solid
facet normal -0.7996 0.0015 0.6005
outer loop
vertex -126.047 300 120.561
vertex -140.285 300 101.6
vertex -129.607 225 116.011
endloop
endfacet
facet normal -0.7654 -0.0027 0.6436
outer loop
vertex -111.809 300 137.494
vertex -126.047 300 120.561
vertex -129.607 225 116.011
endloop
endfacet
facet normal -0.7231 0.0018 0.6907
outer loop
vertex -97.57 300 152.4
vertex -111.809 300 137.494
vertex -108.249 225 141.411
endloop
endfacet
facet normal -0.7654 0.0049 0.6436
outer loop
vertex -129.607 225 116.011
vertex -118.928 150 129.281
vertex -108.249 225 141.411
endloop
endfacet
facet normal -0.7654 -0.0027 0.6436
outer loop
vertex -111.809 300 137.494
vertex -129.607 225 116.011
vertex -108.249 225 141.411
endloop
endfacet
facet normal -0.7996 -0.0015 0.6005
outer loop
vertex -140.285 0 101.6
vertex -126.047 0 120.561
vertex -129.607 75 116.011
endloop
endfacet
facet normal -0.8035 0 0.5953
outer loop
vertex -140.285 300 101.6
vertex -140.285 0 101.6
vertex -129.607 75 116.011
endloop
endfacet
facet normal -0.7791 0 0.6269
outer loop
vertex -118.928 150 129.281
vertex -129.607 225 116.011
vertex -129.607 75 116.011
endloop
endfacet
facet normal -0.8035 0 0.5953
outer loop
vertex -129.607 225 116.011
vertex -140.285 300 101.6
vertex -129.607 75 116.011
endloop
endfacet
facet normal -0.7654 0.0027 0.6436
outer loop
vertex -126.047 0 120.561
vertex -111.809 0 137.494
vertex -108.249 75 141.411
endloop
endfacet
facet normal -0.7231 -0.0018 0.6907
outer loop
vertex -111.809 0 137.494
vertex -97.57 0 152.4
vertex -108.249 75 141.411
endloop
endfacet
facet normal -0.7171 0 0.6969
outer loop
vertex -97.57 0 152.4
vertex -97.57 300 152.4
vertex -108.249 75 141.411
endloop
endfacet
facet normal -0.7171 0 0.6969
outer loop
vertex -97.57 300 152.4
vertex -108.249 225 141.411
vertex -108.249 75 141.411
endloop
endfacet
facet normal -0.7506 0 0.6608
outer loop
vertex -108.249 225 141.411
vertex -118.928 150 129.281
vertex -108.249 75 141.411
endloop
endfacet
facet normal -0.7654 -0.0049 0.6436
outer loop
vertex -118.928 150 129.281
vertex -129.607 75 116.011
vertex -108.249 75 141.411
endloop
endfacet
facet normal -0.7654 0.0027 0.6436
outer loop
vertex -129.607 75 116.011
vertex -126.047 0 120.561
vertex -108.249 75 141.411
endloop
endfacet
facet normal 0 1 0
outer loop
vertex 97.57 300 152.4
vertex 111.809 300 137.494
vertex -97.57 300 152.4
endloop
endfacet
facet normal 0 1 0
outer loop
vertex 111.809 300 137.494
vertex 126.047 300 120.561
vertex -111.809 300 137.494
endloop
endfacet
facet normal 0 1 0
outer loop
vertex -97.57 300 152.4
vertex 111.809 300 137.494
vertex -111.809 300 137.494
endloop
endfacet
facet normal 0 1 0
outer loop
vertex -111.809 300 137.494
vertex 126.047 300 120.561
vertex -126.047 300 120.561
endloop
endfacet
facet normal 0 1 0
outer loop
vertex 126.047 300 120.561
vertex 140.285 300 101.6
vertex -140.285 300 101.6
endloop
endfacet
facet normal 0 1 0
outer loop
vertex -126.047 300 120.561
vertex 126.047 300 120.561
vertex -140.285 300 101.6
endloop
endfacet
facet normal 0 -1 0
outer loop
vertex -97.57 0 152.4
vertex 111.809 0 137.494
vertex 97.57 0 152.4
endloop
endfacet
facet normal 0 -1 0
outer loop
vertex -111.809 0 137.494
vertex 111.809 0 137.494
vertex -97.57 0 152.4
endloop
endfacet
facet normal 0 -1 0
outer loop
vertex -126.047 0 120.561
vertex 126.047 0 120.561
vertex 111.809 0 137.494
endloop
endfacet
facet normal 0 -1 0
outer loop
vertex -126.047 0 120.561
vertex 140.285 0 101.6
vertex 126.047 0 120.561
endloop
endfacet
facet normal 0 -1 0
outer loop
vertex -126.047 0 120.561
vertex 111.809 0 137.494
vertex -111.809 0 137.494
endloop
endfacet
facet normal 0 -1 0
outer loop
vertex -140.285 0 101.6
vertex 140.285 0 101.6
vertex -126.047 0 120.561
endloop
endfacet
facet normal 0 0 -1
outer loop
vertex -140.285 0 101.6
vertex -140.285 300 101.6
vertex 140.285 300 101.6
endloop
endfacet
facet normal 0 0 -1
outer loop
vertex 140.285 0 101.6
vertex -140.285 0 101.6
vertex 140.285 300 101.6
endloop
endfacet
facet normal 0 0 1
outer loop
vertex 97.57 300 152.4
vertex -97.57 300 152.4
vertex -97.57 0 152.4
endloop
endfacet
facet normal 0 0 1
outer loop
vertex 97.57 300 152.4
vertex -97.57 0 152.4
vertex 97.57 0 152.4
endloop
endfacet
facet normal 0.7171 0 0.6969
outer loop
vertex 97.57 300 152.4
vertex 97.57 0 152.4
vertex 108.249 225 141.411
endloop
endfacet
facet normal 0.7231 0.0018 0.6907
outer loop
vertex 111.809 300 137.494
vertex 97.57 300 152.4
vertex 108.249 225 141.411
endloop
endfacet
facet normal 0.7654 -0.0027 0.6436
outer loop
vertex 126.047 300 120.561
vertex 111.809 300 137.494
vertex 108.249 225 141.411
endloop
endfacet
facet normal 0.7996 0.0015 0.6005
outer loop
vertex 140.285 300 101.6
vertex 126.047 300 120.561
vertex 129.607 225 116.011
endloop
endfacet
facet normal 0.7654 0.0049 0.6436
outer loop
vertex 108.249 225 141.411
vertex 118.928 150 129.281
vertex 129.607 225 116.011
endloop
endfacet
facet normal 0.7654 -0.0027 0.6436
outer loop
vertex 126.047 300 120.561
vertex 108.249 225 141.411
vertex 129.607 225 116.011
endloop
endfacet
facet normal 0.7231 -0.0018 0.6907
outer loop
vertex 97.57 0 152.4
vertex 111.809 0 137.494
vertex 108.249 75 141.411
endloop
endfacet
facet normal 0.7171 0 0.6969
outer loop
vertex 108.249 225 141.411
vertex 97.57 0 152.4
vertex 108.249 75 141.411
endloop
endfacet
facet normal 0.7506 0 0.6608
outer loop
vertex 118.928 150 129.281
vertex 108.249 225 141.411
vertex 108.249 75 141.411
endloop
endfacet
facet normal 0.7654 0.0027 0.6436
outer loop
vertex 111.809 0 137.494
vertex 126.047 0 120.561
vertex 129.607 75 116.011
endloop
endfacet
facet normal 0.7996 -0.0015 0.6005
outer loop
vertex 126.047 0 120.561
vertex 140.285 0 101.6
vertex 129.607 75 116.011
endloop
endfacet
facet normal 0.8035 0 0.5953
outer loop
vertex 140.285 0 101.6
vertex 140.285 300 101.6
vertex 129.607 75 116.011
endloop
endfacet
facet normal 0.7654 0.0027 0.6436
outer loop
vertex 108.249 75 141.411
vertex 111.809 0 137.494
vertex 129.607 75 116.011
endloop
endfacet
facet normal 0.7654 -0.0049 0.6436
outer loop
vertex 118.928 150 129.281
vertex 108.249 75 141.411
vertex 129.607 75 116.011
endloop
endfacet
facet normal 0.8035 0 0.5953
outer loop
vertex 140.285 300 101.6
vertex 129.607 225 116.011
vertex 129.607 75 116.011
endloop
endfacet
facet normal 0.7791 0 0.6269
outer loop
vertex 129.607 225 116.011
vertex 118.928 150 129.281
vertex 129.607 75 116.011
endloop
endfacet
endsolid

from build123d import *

# Parameters (mm, degrees)
BOSS_EXTRUDE1_DEPTH = 300
SKETCH2_W           = 518.16192396
SKETCH2_H           = 180.558136174
CUT_EXTRUDE1_DEPTH  = 350
SKETCH3_W           = 500.860284375
SKETCH3_H           = 116.675159248
CUT_EXTRUDE2_DEPTH  = 350


with BuildPart() as part:
    # Sketch1 → Boss-Extrude1 (new body)
    with BuildSketch(Plane(origin=(0, 0, 0), x_dir=(1, 0, 0), z_dir=(0, 1, 0))):
        with BuildLine():
            Line((-200, 1e-09), (200, 1e-09))
            add(Edge.make_bspline(
                [(-200, 1e-09), (0, -400.000000001), (200, 1e-09)],
                knots=[0.056028396, 0.056028396, 0.056028396, 0.943971604, 0.943971604, 0.943971604], degree=2))
        make_face()
    extrude(amount=BOSS_EXTRUDE1_DEPTH)

    # Sketch2 → Cut-Extrude1 (cut)
    with BuildSketch(Plane(origin=(0, 300, 0), x_dir=(1, 0, 0), z_dir=(0, 1, 0))):
        with Locations((17.079823692, -11.320931912)):
            Rectangle(SKETCH2_W, SKETCH2_H)
    extrude(amount=-CUT_EXTRUDE1_DEPTH, mode=Mode.SUBTRACT)

    # Sketch3 → Cut-Extrude2 (cut)
    with BuildSketch(Plane(origin=(0, 300, 0), x_dir=(1, 0, 0), z_dir=(0, 1, 0))):
        with Locations((15.970744232, -210.737579623)):
            Rectangle(SKETCH3_W, SKETCH3_H)
    extrude(amount=-CUT_EXTRUDE2_DEPTH, mode=Mode.SUBTRACT)


solid = part.part
